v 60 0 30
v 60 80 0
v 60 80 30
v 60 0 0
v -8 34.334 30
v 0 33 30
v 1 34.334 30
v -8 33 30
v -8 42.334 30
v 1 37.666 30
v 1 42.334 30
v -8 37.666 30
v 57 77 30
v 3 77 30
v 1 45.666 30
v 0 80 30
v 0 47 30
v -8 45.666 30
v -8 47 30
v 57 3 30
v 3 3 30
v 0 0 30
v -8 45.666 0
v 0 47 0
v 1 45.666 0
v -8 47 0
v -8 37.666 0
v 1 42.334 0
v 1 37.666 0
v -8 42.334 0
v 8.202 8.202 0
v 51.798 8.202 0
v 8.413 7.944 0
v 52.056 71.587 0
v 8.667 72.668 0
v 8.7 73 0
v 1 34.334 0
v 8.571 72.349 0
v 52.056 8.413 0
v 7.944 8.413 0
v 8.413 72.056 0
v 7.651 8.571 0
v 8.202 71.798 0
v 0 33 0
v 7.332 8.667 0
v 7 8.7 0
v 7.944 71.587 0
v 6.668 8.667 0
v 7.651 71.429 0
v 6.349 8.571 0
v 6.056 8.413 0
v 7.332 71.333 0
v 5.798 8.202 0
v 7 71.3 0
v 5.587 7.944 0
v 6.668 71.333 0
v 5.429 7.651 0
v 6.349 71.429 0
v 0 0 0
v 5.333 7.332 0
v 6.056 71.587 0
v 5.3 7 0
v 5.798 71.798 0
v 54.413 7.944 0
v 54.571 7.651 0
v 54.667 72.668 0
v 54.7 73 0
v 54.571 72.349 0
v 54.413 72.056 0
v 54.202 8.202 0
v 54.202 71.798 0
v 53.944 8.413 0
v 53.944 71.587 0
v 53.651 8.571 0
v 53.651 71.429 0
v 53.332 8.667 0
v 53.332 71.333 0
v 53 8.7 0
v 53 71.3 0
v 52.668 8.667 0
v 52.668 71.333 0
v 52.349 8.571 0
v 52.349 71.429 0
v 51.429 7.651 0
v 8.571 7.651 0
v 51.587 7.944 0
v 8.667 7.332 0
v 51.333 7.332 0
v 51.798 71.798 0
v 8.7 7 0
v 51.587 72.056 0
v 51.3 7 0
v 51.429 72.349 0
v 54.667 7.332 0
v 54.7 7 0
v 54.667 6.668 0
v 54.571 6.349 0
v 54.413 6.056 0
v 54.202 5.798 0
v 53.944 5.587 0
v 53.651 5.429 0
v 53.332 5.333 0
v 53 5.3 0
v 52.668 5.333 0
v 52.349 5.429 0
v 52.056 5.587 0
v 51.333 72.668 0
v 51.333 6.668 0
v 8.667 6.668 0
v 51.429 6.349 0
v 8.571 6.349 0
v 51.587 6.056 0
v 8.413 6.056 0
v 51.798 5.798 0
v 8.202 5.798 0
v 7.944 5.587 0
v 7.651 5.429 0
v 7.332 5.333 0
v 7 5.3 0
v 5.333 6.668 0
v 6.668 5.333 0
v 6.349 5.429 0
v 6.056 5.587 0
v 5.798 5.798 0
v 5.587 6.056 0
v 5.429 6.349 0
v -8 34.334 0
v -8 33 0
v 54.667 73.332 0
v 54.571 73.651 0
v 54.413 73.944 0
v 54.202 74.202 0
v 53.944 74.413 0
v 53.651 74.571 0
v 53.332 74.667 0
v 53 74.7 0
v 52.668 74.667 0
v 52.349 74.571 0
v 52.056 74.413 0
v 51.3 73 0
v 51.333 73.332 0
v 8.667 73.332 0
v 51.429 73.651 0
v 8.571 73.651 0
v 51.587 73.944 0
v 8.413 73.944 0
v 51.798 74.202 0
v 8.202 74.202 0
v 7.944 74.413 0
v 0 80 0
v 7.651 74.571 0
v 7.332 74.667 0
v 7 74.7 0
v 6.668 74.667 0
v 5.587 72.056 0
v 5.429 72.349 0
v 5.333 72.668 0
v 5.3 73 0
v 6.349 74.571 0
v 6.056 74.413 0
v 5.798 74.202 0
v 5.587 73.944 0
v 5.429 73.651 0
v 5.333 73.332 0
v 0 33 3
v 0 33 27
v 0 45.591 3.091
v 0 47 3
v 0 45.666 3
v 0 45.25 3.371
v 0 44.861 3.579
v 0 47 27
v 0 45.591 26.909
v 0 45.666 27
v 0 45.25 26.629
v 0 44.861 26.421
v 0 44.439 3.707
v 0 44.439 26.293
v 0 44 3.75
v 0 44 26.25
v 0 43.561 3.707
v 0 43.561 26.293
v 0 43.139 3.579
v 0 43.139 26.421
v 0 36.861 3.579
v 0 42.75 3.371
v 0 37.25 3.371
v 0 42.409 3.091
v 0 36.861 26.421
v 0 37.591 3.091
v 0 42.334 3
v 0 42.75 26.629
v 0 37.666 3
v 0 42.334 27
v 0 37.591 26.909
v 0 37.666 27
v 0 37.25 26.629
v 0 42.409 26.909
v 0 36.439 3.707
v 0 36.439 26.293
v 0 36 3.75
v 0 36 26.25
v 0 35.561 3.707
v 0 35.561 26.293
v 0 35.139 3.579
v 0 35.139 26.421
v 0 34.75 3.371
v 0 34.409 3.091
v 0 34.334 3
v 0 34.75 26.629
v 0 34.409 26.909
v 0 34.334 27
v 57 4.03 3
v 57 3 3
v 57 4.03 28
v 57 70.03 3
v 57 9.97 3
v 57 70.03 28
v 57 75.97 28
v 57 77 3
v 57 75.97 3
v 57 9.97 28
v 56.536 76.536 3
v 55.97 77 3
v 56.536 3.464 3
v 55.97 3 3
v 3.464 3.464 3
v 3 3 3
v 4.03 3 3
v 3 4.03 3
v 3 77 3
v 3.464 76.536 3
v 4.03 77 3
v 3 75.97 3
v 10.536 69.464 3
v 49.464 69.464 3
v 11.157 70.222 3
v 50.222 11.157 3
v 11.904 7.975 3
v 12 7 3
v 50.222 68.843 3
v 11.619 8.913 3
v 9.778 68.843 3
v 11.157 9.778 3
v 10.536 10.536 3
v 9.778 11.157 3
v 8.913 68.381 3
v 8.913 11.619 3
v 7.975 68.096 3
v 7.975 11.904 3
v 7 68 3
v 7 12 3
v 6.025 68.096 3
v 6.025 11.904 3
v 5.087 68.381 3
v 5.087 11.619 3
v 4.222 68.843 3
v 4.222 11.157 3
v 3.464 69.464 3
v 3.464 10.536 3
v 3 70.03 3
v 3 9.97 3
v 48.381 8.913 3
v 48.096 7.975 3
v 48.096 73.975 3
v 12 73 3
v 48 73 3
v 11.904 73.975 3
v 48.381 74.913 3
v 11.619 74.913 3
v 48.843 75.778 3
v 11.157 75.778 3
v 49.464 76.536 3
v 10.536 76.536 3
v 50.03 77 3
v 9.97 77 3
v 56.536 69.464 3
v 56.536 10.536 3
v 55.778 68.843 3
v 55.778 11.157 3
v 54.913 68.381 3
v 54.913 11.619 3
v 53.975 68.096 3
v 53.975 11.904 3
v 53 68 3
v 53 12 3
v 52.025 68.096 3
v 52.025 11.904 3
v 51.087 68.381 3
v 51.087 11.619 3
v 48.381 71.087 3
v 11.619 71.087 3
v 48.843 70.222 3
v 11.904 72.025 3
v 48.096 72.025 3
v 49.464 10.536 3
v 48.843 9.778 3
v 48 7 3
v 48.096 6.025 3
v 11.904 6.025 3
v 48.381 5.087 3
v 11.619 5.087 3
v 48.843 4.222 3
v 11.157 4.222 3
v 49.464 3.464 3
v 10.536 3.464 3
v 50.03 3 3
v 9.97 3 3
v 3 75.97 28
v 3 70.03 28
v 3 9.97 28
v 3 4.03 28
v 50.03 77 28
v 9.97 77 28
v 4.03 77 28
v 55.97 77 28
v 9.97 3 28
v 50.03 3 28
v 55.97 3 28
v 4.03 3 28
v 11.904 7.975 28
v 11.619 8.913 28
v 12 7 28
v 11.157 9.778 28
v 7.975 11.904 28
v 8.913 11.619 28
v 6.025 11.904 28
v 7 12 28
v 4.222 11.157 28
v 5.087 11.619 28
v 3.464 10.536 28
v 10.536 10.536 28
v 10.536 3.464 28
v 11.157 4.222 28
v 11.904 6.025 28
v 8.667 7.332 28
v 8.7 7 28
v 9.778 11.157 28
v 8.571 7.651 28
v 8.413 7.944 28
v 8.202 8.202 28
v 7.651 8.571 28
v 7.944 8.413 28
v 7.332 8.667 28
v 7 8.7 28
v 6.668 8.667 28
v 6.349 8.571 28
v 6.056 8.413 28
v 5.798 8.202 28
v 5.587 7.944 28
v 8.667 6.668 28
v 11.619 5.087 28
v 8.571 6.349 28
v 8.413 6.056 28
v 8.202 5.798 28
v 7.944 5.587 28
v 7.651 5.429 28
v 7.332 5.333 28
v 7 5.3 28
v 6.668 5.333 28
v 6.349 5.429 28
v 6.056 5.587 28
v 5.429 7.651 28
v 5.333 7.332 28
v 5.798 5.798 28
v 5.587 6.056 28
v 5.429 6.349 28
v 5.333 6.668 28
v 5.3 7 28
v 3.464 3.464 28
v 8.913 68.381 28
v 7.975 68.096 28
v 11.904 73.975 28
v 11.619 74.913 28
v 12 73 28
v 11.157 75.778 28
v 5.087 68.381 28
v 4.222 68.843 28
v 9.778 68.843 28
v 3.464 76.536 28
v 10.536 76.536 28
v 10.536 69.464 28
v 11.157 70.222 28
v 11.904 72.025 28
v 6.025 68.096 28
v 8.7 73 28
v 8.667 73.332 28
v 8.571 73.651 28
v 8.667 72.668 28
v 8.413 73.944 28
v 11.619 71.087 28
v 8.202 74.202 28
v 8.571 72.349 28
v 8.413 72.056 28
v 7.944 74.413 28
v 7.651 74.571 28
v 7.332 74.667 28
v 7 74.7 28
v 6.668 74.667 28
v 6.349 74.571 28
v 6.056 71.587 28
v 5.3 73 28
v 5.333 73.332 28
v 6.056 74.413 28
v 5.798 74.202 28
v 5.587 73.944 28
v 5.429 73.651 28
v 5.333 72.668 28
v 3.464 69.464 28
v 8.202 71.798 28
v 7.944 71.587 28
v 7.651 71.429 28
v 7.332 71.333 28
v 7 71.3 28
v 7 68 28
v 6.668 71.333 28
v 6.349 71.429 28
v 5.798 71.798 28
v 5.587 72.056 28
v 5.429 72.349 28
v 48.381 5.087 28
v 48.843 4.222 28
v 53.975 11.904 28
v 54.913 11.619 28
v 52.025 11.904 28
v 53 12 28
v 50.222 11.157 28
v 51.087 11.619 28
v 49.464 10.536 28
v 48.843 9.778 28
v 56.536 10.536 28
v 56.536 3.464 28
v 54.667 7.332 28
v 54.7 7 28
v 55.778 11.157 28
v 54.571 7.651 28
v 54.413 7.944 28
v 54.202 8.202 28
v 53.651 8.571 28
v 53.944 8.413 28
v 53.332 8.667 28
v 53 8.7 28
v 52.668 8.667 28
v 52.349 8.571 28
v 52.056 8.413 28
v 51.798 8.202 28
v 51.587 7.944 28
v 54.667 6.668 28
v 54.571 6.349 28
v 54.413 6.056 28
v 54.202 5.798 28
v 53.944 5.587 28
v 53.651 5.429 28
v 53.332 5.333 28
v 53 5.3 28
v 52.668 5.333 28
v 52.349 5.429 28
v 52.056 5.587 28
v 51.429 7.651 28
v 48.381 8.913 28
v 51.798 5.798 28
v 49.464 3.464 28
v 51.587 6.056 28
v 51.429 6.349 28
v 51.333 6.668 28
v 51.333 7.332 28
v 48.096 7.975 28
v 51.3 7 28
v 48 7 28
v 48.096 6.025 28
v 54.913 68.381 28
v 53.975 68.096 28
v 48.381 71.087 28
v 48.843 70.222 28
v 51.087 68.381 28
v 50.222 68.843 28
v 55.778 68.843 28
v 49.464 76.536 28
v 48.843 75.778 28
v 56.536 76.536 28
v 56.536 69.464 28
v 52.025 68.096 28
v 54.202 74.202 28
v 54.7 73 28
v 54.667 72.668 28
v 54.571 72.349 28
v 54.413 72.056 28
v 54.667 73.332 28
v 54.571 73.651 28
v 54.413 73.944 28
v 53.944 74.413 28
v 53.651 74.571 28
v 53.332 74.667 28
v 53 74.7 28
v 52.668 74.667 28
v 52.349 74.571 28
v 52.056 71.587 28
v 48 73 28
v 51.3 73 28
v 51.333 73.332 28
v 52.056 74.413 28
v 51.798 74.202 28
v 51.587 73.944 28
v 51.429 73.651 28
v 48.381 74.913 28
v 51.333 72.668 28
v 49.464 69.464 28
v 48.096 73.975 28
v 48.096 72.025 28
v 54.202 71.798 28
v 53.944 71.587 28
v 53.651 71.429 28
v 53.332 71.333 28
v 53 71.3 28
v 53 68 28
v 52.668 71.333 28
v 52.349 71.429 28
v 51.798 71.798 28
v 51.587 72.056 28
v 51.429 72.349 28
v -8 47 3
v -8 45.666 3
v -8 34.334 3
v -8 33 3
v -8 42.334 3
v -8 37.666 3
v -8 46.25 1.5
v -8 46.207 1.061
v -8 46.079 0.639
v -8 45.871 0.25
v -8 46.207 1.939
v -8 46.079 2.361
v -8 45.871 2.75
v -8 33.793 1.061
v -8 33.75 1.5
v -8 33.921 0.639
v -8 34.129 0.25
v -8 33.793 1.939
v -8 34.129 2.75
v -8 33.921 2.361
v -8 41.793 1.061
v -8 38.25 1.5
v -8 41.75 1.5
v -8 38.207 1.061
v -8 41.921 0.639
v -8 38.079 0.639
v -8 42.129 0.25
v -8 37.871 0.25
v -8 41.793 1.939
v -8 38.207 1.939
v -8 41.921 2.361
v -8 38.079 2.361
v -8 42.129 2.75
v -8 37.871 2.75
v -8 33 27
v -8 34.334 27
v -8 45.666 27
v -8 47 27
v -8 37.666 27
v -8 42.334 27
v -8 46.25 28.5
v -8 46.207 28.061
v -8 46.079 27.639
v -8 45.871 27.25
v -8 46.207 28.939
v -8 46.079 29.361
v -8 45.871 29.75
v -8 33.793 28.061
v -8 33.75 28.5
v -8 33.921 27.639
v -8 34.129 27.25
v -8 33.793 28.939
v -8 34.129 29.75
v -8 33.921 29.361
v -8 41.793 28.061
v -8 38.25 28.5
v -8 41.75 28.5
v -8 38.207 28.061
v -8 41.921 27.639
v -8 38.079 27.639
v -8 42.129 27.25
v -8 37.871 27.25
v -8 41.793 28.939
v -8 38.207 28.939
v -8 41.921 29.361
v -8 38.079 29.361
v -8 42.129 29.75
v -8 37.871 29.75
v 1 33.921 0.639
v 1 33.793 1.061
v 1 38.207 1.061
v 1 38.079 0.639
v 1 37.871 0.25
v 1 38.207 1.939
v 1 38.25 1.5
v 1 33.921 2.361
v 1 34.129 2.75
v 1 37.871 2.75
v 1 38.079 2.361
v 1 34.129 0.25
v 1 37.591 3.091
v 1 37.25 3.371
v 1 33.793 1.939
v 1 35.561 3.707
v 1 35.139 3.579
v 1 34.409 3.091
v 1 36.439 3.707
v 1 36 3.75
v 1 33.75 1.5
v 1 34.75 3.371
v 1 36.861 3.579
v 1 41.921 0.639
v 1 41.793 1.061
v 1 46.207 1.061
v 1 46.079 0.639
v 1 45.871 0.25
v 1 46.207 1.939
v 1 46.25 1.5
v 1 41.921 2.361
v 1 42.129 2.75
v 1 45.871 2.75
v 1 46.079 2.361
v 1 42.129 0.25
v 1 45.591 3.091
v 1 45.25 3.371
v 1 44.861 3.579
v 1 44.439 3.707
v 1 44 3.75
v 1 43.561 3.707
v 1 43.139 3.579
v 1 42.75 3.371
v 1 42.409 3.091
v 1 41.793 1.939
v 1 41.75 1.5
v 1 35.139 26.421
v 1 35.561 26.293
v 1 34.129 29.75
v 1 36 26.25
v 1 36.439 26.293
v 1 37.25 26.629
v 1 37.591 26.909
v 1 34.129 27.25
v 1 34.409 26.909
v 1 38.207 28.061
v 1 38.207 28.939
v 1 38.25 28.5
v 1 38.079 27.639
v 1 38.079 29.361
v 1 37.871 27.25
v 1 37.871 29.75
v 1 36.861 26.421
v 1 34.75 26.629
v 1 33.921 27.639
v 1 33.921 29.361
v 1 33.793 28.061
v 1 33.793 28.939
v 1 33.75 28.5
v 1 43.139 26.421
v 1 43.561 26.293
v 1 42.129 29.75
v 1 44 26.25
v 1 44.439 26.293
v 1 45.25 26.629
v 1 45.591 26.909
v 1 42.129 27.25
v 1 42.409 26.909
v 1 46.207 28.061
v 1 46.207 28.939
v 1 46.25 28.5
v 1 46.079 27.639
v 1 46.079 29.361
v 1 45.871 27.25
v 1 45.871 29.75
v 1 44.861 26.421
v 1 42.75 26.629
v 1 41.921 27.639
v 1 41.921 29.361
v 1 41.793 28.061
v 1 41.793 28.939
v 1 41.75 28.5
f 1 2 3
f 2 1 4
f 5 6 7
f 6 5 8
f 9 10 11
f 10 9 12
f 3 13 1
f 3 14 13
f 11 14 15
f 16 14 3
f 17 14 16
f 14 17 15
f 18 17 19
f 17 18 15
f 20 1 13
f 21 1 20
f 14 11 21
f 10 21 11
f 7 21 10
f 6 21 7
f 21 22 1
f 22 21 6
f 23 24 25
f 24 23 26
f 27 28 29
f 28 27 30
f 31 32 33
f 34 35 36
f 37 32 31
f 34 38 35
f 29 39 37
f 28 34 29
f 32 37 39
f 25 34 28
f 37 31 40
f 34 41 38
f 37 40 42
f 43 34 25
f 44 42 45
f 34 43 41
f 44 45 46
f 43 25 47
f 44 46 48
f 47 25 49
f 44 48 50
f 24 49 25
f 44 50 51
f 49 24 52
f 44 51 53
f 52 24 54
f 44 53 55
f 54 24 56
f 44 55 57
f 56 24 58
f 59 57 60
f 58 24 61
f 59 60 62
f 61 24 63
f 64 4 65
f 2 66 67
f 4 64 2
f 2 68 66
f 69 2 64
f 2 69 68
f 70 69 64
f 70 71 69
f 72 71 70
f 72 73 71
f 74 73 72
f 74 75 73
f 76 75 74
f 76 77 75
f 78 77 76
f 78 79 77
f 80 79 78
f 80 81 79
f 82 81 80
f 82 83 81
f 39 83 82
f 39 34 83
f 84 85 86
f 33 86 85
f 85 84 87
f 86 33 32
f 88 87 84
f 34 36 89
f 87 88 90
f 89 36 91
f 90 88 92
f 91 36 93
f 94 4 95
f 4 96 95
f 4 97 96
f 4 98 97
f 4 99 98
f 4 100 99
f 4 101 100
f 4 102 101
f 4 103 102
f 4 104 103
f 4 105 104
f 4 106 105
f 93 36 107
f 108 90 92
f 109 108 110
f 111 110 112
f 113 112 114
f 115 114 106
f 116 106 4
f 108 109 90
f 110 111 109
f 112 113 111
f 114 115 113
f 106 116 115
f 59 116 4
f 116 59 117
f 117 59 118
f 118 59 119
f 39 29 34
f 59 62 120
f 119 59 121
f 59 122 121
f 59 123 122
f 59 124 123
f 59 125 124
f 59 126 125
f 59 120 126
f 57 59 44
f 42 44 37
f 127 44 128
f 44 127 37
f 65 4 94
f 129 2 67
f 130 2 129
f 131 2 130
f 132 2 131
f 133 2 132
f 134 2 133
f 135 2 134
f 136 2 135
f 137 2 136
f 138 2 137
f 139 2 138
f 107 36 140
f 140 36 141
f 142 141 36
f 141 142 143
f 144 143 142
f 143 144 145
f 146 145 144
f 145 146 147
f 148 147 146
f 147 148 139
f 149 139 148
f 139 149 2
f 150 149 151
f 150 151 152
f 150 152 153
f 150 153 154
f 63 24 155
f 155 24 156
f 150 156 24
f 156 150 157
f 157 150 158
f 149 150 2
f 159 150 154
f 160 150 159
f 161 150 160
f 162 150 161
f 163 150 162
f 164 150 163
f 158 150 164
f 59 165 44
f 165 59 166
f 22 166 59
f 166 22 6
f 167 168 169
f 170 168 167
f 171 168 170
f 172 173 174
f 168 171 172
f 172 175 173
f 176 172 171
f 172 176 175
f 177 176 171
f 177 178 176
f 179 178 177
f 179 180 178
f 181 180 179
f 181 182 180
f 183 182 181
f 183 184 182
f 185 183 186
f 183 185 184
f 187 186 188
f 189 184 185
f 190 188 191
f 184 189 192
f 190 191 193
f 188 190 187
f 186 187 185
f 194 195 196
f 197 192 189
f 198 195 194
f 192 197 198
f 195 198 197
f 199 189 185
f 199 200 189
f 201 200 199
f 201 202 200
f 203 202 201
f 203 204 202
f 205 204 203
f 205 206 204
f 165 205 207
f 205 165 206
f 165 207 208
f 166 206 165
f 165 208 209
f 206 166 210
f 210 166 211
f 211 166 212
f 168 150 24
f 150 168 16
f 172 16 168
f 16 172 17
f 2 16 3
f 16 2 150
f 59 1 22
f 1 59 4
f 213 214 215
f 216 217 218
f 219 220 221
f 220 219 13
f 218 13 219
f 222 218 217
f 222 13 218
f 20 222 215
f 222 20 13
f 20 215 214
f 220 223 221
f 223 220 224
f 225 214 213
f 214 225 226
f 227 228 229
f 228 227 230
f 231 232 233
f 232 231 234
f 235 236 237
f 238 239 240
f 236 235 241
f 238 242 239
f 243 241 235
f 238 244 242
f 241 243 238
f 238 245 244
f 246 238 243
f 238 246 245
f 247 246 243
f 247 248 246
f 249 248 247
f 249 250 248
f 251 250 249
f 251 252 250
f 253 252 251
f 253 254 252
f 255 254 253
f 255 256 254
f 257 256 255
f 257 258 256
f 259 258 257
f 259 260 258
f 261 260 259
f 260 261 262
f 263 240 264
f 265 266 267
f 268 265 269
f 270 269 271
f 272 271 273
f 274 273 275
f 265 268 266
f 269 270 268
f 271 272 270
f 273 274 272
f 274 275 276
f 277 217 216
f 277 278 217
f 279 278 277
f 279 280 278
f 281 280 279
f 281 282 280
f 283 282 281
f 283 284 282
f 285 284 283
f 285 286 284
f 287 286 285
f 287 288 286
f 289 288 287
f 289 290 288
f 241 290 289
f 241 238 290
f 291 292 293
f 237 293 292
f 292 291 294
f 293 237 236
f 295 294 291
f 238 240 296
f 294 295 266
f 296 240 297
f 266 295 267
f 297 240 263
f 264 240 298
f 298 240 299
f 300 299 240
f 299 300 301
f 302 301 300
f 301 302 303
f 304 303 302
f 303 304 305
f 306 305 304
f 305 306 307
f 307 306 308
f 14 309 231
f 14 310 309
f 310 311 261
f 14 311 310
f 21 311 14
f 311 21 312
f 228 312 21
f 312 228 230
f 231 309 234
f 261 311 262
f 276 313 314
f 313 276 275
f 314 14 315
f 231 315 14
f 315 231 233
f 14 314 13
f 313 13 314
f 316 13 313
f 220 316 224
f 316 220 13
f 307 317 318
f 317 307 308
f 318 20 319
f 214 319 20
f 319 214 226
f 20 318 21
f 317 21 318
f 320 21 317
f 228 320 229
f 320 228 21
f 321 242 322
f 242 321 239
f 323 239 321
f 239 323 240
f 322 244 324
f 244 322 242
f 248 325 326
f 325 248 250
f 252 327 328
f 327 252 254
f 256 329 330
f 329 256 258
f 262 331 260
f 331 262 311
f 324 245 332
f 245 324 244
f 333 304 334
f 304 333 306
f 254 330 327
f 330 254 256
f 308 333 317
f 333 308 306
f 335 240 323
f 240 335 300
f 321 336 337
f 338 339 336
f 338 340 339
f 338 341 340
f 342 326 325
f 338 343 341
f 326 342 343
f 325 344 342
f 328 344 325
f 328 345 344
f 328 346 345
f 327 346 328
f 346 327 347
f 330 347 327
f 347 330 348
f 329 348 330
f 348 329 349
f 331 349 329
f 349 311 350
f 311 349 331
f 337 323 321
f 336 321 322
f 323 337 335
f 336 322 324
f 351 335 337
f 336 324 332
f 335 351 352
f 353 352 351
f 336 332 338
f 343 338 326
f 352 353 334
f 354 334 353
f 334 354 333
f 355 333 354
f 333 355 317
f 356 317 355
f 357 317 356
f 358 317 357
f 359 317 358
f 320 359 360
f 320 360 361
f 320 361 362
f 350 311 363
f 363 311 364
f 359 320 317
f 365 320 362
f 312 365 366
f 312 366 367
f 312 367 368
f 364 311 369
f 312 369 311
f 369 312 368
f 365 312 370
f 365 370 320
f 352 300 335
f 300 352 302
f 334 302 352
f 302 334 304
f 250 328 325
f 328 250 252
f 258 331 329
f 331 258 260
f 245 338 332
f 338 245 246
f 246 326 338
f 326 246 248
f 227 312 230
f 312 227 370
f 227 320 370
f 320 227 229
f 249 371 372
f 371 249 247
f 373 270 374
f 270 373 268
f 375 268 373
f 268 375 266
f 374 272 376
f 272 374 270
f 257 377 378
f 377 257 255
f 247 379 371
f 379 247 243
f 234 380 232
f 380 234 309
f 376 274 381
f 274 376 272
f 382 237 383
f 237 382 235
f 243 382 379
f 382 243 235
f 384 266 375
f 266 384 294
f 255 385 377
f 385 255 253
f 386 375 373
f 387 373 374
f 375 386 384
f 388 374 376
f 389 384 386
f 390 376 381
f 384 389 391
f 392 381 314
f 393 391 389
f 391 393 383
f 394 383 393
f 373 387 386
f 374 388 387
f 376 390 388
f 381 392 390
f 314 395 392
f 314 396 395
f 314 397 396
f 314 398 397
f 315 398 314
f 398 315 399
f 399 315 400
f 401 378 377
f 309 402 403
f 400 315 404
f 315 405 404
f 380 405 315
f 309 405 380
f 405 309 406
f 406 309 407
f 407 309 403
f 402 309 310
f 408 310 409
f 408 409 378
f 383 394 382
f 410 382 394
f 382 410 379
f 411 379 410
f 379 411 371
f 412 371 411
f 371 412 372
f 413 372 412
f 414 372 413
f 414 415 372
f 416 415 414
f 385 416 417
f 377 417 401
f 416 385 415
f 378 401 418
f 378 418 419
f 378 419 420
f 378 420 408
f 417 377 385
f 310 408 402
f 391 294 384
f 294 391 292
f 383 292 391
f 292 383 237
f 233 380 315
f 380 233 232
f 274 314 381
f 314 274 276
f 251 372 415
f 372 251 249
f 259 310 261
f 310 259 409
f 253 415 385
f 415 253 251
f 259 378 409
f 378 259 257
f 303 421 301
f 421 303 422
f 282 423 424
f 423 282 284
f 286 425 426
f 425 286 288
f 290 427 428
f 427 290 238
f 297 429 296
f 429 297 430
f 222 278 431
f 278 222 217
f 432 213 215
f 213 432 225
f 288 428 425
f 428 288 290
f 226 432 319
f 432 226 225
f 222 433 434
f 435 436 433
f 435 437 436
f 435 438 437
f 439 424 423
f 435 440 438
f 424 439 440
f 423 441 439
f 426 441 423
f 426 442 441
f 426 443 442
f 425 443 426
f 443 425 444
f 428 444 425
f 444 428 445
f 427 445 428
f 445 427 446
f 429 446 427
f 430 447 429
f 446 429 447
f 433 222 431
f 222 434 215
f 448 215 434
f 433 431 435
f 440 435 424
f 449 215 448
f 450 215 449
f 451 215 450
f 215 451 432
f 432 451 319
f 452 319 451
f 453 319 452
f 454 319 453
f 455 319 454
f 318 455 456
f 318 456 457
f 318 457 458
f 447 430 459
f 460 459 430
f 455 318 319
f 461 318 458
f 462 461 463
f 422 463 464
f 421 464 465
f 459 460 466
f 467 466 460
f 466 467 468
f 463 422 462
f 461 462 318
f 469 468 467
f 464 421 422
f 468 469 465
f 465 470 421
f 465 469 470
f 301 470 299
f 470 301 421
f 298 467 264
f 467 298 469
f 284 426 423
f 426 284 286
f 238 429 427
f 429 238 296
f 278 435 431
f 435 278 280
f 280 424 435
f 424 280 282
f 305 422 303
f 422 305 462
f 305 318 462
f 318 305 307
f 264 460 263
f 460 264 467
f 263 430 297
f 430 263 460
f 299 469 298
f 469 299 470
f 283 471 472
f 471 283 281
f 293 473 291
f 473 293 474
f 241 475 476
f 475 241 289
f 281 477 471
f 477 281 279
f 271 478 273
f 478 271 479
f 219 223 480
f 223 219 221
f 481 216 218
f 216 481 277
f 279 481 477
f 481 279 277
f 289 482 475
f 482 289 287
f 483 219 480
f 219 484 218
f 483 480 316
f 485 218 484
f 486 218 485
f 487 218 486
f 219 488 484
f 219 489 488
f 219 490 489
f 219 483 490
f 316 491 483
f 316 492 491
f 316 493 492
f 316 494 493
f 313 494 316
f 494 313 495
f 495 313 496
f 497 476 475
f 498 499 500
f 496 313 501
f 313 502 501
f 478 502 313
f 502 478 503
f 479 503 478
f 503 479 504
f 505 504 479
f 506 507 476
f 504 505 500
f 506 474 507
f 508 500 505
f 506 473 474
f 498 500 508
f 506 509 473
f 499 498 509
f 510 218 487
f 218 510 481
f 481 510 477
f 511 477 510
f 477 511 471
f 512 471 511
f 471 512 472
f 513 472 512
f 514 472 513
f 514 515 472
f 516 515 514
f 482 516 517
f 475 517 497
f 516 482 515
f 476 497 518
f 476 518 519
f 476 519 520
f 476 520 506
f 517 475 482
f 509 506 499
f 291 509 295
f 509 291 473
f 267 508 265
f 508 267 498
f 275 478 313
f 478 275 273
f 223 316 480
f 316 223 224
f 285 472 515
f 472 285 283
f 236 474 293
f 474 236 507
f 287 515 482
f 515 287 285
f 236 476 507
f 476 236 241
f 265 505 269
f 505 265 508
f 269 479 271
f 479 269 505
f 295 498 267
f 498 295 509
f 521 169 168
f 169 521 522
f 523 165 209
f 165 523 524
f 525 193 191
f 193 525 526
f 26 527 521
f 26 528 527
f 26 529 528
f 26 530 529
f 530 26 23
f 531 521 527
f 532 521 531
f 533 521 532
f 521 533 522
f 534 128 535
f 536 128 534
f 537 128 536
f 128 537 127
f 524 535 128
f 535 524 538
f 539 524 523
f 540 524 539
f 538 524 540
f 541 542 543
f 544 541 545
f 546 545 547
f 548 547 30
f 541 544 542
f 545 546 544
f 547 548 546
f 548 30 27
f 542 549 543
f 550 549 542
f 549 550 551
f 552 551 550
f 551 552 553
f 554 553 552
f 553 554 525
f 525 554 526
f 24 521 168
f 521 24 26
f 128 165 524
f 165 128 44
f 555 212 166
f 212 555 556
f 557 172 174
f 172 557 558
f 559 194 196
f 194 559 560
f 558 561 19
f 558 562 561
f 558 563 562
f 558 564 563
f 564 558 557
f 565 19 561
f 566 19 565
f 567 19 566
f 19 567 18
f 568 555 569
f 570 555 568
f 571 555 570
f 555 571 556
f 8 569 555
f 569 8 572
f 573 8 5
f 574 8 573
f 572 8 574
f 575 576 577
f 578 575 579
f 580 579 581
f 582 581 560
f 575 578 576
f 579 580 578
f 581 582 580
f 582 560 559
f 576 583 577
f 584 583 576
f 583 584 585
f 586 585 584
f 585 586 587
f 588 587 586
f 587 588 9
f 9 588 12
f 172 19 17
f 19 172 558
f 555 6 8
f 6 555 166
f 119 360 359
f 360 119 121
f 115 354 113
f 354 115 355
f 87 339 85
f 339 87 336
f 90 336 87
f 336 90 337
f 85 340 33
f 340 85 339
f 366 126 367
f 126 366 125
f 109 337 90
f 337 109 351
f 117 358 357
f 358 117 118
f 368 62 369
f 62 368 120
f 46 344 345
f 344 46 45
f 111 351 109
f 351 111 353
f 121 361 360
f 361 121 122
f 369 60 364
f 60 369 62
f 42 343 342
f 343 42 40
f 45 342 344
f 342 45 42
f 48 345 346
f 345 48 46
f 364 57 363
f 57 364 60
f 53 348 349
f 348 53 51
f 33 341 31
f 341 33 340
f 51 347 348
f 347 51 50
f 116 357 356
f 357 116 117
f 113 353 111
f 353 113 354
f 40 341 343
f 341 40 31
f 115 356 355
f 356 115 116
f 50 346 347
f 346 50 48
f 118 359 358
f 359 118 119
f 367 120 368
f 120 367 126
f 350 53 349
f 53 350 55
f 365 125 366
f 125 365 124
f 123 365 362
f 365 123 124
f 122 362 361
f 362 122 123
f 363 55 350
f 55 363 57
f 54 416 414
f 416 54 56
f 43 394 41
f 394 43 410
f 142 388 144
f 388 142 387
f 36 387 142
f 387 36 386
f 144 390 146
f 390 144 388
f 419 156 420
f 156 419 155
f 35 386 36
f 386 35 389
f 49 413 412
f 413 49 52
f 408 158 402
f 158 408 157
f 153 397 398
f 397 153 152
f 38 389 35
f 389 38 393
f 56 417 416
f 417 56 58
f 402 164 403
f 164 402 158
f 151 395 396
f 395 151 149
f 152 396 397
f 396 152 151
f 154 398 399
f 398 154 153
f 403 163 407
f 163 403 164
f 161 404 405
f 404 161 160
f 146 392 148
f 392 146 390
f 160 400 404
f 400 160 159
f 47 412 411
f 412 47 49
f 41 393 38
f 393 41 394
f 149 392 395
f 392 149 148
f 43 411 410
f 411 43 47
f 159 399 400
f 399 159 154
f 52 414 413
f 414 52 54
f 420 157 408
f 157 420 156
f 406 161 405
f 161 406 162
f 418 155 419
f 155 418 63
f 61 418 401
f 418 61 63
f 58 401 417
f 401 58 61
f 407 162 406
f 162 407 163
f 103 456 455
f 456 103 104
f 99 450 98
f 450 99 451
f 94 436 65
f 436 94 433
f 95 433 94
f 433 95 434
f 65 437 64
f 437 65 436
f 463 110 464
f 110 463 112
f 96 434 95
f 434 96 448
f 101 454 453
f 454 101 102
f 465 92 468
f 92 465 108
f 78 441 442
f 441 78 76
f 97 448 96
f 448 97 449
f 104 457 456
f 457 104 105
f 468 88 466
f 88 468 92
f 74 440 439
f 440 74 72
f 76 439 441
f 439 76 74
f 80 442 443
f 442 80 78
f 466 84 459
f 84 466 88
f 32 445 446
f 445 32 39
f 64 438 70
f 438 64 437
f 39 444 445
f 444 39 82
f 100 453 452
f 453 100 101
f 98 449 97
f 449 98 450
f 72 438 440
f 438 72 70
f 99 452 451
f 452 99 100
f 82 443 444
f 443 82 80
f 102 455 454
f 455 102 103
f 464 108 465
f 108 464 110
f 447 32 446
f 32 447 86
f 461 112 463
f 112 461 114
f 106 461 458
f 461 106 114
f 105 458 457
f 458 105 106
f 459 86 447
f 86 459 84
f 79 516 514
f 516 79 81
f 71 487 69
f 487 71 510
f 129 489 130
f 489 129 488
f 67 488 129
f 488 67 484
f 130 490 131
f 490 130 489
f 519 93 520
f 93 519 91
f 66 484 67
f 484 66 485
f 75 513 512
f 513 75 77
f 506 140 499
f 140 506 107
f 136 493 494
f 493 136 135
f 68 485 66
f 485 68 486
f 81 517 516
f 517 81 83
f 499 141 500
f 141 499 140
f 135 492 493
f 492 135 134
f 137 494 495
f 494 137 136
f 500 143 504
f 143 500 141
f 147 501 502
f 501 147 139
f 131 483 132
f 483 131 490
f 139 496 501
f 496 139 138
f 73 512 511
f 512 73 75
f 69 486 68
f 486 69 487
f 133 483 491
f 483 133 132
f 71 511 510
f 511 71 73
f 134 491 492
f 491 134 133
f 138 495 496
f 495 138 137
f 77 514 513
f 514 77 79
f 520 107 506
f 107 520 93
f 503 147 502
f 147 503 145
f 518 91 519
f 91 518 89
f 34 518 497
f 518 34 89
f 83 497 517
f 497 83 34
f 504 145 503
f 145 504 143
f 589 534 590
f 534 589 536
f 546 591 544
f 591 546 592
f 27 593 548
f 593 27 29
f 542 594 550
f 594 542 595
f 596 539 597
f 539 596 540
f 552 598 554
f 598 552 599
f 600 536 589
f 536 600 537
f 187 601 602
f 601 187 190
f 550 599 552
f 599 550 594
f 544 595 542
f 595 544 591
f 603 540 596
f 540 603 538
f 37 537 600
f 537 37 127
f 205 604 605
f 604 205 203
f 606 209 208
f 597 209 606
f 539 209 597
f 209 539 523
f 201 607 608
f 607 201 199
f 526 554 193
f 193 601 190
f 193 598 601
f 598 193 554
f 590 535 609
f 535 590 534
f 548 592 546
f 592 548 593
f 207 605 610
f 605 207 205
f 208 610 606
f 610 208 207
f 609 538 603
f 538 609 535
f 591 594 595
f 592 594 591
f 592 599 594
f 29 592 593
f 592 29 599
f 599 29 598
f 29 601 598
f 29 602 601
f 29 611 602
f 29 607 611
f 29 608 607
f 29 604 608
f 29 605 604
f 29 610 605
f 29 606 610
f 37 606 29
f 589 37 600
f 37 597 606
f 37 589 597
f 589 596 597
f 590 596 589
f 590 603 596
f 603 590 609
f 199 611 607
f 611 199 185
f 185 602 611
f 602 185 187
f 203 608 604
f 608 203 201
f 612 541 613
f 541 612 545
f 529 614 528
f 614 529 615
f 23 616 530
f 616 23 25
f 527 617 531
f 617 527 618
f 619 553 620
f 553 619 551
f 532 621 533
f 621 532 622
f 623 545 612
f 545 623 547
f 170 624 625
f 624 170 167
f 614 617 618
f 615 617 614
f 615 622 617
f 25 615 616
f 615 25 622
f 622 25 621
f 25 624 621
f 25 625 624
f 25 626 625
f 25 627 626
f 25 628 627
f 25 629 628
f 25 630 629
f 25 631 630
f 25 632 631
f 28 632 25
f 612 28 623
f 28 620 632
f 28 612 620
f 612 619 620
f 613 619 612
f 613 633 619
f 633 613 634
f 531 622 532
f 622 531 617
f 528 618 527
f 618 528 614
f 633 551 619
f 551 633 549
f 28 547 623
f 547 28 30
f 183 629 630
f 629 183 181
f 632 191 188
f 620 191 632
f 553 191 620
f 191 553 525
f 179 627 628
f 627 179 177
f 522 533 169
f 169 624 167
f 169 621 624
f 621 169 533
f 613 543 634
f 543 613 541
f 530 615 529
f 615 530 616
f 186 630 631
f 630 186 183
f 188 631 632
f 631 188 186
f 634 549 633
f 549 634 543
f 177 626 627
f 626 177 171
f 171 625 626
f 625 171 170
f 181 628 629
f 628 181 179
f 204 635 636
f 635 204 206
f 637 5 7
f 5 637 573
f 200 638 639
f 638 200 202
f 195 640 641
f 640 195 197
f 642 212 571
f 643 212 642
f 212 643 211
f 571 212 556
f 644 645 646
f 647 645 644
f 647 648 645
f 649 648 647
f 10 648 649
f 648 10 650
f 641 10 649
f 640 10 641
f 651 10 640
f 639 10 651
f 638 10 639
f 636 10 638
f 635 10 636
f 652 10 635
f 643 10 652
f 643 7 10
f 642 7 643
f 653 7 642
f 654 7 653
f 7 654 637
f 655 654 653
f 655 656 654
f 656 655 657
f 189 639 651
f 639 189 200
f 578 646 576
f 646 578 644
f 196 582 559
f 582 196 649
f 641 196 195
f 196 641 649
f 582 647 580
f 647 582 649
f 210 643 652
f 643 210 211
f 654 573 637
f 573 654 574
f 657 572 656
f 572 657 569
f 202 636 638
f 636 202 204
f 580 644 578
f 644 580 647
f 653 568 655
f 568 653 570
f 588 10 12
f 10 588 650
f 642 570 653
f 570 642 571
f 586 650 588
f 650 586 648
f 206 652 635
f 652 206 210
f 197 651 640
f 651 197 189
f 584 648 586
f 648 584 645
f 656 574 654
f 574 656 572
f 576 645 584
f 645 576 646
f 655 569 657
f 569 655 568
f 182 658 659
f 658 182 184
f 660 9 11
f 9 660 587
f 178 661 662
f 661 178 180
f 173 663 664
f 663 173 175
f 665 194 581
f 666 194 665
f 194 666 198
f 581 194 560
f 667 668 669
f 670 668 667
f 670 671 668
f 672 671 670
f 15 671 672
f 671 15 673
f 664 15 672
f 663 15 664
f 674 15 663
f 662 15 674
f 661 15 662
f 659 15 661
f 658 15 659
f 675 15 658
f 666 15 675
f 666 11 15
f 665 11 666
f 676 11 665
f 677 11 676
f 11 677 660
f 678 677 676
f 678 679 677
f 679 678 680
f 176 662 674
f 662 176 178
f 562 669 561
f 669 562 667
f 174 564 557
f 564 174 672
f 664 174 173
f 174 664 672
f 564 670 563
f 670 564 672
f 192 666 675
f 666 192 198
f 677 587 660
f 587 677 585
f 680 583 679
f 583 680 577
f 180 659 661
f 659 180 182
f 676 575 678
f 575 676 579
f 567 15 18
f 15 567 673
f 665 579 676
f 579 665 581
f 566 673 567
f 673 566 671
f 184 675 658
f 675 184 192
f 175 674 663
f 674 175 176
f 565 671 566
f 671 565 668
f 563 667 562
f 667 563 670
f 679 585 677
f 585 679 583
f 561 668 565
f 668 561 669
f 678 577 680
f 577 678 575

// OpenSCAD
$fn = 32;

// ----------------------------------------------------------------------
// Enclosure body: 60 x 80 x 30 mm, wall 3 mm
// ----------------------------------------------------------------------

// --- parameters (mm) ---
length = 60;              // outside length, X
width = 80;               // outside width, Y
height = 30;              // outside height, Z
wall = 3;                 // side wall thickness
floor_t = 3;              // floor thickness
boss_d = 10;              // corner boss diameter
boss_h = 25;              // corner boss height above the floor
boss_hole_d = 3.4;        // lid screw clearance in the boss
boss_lip = 7;             // boss centre inset from the corner
ear_w = 14;               // mounting ear width
ear_t = 3;                // mounting ear thickness
ear_ext = 8;              // mounting ear reach
ear_hole_d = 4.5;         // mounting ear drills

module shell() {
  difference() {
    cube([length, width, height]);
    /* hollow, open at the top */
    translate([wall, wall, floor_t])
      cube([length - 2 * wall, width - 2 * wall, height]);
  }
}

module bosses() {
  /* corner bosses, sunk 1 mm into the floor */
  for (sx = [0, 1]) for (sy = [0, 1])
    translate([sx * (length - 2 * boss_lip) + boss_lip, sy * (width - 2 * boss_lip) + boss_lip, floor_t - 1])
      cylinder(h = boss_h + 1, d = boss_d);
}

module ears() {
  /* mounting ears on the short walls, sunk into the wall */
  for (sz = [0, 1])
    translate([-ear_ext, width / 2 - ear_w / 2, sz * (height - ear_t)])
      cube([ear_ext + 2.5, ear_w, ear_t]);
}

difference() {
  union() {
    shell();
    bosses();
    ears();
  }
  /* boss screw holes */
  for (sx = [0, 1]) for (sy = [0, 1])
    translate([sx * (length - 2 * boss_lip) + boss_lip, sy * (width - 2 * boss_lip) + boss_lip, -1]) cylinder(h = floor_t + boss_h + 2, d = boss_hole_d);
  for (sz = [0, 1]) for (sx = [0, 1]) translate([-ear_ext - 1, width / 2 + (2 * sx - 1) * (ear_w / 2 - 3), sz * (height - ear_t) + ear_t / 2]) rotate([0, 90, 0]) cylinder(h = ear_ext + 2, d = ear_hole_d);
}
